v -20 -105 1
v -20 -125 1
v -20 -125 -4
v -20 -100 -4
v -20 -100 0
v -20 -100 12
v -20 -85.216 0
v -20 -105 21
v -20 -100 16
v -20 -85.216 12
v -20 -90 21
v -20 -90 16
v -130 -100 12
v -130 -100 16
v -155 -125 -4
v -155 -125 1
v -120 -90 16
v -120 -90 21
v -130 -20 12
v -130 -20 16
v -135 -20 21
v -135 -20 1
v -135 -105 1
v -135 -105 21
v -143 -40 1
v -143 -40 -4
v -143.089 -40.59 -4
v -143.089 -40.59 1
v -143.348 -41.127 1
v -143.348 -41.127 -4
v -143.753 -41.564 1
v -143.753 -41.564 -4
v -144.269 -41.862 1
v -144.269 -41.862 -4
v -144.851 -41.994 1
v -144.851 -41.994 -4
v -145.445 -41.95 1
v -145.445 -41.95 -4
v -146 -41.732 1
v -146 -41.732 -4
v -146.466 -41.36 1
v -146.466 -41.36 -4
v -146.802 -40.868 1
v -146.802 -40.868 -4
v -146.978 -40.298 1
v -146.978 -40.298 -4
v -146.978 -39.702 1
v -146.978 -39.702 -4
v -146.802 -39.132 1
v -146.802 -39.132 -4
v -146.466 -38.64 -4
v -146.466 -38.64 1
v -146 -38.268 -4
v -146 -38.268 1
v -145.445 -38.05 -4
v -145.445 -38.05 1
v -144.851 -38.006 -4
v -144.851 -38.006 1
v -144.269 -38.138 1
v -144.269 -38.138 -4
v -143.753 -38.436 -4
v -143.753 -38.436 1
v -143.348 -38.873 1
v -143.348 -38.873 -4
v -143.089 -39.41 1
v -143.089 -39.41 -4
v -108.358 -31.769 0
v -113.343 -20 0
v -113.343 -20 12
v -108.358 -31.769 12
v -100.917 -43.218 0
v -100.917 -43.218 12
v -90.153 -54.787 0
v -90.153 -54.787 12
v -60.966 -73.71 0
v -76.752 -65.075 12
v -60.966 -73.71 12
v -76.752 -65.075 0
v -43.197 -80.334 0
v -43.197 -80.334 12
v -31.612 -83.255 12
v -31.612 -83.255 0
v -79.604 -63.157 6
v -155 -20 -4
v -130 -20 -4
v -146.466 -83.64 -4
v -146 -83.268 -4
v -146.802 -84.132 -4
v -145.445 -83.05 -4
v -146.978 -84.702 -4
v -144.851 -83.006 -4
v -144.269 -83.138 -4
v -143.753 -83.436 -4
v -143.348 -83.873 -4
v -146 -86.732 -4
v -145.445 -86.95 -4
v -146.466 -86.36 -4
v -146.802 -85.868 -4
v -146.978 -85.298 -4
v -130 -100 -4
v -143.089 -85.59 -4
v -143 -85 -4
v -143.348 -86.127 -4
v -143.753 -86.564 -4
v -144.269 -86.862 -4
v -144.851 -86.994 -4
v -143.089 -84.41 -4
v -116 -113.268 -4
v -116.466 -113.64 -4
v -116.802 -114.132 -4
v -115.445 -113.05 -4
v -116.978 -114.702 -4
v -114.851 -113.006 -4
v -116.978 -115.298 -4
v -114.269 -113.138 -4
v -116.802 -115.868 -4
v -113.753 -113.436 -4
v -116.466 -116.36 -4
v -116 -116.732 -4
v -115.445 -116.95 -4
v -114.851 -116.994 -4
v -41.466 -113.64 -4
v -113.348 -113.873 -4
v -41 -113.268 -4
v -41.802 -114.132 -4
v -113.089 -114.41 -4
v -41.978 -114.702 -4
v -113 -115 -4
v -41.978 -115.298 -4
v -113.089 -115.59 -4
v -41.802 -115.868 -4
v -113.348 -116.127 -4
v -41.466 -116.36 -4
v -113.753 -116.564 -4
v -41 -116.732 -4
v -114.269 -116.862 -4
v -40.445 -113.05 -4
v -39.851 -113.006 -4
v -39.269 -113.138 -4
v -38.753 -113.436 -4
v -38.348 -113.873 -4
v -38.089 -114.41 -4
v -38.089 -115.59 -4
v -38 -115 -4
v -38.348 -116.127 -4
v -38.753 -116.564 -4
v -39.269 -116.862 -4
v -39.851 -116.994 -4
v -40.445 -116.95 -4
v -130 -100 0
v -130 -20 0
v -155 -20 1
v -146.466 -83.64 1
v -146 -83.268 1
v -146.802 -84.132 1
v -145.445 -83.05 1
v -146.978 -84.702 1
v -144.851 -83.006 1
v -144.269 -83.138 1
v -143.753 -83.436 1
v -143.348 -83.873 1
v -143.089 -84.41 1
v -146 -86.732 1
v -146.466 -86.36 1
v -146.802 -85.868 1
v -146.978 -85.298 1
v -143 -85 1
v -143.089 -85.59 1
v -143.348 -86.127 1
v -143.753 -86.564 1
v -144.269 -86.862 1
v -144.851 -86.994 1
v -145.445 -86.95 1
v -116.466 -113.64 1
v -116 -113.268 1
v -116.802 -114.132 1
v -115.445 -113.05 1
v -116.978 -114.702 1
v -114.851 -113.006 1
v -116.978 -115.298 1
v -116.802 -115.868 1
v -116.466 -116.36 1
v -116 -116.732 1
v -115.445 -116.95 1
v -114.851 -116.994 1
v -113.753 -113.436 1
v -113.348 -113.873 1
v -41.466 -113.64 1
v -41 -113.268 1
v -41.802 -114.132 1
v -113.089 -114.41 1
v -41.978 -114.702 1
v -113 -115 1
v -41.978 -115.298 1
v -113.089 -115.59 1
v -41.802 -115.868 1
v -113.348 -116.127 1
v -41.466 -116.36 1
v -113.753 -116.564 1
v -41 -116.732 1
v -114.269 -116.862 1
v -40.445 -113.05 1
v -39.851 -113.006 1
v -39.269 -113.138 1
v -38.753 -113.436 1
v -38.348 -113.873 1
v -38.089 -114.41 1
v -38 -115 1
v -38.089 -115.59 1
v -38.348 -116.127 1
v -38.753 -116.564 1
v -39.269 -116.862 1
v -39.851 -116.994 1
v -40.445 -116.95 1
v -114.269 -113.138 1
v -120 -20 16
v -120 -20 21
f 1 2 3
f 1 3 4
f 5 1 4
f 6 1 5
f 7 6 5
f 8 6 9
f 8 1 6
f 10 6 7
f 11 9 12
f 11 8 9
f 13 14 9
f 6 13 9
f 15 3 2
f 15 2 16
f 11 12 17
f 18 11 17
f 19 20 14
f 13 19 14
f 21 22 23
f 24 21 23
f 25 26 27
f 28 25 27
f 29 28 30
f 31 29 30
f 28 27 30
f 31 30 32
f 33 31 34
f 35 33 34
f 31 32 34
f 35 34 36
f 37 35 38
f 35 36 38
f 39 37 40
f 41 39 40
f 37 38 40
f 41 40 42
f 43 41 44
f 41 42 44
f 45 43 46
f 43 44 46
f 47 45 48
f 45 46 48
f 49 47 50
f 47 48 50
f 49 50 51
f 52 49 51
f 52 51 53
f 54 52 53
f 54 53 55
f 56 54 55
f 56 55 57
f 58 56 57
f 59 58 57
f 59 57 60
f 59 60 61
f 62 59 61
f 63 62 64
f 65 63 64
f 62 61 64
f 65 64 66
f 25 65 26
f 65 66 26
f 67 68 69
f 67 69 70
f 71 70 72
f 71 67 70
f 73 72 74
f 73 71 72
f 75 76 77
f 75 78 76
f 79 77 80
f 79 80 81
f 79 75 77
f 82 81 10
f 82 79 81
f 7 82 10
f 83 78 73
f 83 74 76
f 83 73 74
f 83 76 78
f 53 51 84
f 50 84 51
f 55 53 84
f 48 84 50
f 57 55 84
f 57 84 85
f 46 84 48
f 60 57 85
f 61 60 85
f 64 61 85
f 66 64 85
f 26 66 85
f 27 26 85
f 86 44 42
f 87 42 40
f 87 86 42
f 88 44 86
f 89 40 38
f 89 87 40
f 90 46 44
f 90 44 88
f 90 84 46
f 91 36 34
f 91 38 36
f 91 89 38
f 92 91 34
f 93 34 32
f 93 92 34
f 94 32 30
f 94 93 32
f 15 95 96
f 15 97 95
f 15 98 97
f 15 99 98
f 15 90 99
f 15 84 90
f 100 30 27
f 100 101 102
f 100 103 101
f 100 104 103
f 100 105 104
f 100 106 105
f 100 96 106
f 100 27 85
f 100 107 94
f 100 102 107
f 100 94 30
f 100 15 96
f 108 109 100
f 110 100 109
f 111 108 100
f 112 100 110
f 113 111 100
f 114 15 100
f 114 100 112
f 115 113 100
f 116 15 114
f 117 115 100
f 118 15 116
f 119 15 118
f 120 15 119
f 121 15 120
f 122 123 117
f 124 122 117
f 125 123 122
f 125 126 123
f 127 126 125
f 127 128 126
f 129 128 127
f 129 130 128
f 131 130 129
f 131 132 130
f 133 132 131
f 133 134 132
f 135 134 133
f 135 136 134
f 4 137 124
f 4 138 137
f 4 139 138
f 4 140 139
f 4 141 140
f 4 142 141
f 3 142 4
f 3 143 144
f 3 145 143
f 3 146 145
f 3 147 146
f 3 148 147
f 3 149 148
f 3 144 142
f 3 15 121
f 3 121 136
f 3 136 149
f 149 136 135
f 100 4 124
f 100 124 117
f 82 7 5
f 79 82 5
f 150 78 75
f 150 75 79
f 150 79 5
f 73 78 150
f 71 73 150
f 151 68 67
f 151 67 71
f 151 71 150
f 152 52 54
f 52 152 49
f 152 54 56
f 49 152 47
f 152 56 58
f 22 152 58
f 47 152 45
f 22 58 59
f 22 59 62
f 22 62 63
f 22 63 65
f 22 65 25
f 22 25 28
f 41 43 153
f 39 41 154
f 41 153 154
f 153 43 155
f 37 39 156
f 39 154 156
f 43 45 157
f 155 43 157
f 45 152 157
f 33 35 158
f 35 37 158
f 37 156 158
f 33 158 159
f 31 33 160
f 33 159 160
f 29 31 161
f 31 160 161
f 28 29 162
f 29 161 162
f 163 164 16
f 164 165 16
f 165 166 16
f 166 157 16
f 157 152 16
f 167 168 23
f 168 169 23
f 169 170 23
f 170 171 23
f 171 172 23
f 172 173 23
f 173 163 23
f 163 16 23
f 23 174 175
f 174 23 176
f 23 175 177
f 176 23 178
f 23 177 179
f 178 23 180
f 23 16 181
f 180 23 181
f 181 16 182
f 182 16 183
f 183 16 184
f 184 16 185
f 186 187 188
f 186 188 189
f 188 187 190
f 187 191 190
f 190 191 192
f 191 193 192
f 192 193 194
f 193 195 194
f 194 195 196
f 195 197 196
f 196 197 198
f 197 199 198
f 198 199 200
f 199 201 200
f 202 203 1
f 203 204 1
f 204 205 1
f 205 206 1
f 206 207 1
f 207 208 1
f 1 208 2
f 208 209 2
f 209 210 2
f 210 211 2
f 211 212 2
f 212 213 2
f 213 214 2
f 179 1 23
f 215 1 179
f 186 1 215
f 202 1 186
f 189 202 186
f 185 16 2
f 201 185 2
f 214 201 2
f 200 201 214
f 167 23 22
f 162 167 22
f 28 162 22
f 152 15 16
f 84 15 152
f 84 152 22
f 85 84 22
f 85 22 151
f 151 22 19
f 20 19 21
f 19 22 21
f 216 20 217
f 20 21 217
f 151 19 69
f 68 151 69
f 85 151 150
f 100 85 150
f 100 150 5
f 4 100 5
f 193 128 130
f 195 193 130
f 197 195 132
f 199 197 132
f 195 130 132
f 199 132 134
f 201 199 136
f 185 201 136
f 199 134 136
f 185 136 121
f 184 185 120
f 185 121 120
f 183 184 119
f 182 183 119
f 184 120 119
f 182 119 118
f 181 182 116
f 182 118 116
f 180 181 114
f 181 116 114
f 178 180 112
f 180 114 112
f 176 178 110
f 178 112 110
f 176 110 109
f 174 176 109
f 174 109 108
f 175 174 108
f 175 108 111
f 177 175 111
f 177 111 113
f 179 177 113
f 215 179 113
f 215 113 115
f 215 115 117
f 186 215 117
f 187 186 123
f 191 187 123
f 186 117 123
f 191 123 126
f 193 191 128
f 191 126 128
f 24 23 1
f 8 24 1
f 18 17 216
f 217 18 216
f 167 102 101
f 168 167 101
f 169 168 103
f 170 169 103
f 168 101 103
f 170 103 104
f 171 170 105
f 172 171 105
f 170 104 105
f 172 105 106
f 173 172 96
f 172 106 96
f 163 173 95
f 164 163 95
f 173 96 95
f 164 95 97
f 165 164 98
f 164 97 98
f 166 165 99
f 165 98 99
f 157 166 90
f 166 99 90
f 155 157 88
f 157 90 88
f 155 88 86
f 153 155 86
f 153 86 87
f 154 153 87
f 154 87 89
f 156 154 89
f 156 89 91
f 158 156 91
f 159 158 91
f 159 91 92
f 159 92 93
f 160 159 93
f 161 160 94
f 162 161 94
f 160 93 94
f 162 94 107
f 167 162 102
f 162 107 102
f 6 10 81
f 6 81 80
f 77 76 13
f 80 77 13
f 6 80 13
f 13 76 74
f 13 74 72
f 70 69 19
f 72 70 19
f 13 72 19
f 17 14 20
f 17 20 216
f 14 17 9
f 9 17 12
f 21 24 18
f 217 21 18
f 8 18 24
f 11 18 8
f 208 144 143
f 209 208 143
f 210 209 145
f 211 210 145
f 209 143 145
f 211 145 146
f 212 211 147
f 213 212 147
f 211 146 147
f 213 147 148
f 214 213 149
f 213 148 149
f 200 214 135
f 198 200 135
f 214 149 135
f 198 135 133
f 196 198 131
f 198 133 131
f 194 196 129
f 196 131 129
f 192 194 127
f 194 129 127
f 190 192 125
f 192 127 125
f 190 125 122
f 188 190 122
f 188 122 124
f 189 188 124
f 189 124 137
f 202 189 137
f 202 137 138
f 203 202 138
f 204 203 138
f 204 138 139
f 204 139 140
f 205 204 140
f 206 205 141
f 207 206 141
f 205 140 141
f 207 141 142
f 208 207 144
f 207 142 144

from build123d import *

# Parameters (mm, degrees)
F1_DEPTH  = 12
F2_W      = 130
F2_H      = 20
F3_DEPTH  = 5
F4_W      = 105
F4_H      = 20
F5_DEPTH  = 5
F6_R      = 2
F7_DEPTH  = 5
F9_DEPTH  = 5
F10_W     = 135
F10_H     = 20
F10_W_2   = 20
F10_H_2   = 105
F11_DEPTH = 25


with BuildPart() as f1:
    # F0 (on Top) → F1 (new body)
    with BuildSketch(Plane.XY):
        with BuildLine():
            add(Edge.make_bspline(
                [(-116.5, 0), (-116.5, -86.5), (0, -86.5)],
                knots=[3.1415926536, 3.1415926536, 3.1415926536, 4.7123889804, 4.7123889804, 4.7123889804], degree=2, weights=[1, 0.7071067812, 1]))
            Line((-116.5, 0), (-116.5, -86.5))
            Line((-116.5, -86.5), (0, -86.5))
        make_face()
        Polygon((-116.5, -86.5), (-116.5, 0), (-130, 0), (-130, -100), (0, -100), (0, -86.5), align=None)
    extrude(amount=F1_DEPTH)

    # F2 (on face) → F3 (join)
    with BuildSketch(Plane.XZ.offset(100)):
        with Locations((-65, 6)):
            Rectangle(F2_W, F2_H)
    extrude(amount=F3_DEPTH)

    # F4 (on face) → F5 (join)
    with BuildSketch(Plane(origin=(-130, 0, 0), x_dir=(0, -1, 0), z_dir=(-1, 0, 0))):
        with Locations((52.5, 6)):
            Rectangle(F4_W, F4_H)
    extrude(amount=F5_DEPTH)

    # F6 (on face) → F7 (join)
    with BuildSketch(Plane(origin=(0, 0, -4), x_dir=(1, 0, 0), z_dir=(0, 0, -1))):
        Polygon((0, 105), (0, 125), (-155, 125), (-155, 0), (-135, 0), (-135, 105), align=None)
        with Locations((-145, 40)):
            Circle(F6_R, mode=Mode.SUBTRACT)
        with Locations((-145, 85)):
            Circle(F6_R, mode=Mode.SUBTRACT)
        with Locations((-115, 115)):
            Circle(F6_R, mode=Mode.SUBTRACT)
        with Locations((-40, 115)):
            Circle(F6_R, mode=Mode.SUBTRACT)
    extrude(amount=-F7_DEPTH)

    # F8 (on face) → F9 (join)
    with BuildSketch(Plane.XY.offset(16)):
        Polygon((-120, 0), (-135, 0), (-135, -105), (0, -105), (0, -90), (-120, -90), align=None)
    extrude(amount=F9_DEPTH)

    # F10 (on Top) → F11 (cut, symmetric)
    with BuildSketch(Plane.XY):
        with Locations((-87.5, -10)):
            Rectangle(F10_W, F10_H)
        with Locations((-10, -10)):
            Rectangle(F10_W_2, F10_H)
        with Locations((-10, -72.5)):
            Rectangle(F10_W_2, F10_H_2)
    extrude(amount=F11_DEPTH, both=True, mode=Mode.SUBTRACT)


solid = f1.part
